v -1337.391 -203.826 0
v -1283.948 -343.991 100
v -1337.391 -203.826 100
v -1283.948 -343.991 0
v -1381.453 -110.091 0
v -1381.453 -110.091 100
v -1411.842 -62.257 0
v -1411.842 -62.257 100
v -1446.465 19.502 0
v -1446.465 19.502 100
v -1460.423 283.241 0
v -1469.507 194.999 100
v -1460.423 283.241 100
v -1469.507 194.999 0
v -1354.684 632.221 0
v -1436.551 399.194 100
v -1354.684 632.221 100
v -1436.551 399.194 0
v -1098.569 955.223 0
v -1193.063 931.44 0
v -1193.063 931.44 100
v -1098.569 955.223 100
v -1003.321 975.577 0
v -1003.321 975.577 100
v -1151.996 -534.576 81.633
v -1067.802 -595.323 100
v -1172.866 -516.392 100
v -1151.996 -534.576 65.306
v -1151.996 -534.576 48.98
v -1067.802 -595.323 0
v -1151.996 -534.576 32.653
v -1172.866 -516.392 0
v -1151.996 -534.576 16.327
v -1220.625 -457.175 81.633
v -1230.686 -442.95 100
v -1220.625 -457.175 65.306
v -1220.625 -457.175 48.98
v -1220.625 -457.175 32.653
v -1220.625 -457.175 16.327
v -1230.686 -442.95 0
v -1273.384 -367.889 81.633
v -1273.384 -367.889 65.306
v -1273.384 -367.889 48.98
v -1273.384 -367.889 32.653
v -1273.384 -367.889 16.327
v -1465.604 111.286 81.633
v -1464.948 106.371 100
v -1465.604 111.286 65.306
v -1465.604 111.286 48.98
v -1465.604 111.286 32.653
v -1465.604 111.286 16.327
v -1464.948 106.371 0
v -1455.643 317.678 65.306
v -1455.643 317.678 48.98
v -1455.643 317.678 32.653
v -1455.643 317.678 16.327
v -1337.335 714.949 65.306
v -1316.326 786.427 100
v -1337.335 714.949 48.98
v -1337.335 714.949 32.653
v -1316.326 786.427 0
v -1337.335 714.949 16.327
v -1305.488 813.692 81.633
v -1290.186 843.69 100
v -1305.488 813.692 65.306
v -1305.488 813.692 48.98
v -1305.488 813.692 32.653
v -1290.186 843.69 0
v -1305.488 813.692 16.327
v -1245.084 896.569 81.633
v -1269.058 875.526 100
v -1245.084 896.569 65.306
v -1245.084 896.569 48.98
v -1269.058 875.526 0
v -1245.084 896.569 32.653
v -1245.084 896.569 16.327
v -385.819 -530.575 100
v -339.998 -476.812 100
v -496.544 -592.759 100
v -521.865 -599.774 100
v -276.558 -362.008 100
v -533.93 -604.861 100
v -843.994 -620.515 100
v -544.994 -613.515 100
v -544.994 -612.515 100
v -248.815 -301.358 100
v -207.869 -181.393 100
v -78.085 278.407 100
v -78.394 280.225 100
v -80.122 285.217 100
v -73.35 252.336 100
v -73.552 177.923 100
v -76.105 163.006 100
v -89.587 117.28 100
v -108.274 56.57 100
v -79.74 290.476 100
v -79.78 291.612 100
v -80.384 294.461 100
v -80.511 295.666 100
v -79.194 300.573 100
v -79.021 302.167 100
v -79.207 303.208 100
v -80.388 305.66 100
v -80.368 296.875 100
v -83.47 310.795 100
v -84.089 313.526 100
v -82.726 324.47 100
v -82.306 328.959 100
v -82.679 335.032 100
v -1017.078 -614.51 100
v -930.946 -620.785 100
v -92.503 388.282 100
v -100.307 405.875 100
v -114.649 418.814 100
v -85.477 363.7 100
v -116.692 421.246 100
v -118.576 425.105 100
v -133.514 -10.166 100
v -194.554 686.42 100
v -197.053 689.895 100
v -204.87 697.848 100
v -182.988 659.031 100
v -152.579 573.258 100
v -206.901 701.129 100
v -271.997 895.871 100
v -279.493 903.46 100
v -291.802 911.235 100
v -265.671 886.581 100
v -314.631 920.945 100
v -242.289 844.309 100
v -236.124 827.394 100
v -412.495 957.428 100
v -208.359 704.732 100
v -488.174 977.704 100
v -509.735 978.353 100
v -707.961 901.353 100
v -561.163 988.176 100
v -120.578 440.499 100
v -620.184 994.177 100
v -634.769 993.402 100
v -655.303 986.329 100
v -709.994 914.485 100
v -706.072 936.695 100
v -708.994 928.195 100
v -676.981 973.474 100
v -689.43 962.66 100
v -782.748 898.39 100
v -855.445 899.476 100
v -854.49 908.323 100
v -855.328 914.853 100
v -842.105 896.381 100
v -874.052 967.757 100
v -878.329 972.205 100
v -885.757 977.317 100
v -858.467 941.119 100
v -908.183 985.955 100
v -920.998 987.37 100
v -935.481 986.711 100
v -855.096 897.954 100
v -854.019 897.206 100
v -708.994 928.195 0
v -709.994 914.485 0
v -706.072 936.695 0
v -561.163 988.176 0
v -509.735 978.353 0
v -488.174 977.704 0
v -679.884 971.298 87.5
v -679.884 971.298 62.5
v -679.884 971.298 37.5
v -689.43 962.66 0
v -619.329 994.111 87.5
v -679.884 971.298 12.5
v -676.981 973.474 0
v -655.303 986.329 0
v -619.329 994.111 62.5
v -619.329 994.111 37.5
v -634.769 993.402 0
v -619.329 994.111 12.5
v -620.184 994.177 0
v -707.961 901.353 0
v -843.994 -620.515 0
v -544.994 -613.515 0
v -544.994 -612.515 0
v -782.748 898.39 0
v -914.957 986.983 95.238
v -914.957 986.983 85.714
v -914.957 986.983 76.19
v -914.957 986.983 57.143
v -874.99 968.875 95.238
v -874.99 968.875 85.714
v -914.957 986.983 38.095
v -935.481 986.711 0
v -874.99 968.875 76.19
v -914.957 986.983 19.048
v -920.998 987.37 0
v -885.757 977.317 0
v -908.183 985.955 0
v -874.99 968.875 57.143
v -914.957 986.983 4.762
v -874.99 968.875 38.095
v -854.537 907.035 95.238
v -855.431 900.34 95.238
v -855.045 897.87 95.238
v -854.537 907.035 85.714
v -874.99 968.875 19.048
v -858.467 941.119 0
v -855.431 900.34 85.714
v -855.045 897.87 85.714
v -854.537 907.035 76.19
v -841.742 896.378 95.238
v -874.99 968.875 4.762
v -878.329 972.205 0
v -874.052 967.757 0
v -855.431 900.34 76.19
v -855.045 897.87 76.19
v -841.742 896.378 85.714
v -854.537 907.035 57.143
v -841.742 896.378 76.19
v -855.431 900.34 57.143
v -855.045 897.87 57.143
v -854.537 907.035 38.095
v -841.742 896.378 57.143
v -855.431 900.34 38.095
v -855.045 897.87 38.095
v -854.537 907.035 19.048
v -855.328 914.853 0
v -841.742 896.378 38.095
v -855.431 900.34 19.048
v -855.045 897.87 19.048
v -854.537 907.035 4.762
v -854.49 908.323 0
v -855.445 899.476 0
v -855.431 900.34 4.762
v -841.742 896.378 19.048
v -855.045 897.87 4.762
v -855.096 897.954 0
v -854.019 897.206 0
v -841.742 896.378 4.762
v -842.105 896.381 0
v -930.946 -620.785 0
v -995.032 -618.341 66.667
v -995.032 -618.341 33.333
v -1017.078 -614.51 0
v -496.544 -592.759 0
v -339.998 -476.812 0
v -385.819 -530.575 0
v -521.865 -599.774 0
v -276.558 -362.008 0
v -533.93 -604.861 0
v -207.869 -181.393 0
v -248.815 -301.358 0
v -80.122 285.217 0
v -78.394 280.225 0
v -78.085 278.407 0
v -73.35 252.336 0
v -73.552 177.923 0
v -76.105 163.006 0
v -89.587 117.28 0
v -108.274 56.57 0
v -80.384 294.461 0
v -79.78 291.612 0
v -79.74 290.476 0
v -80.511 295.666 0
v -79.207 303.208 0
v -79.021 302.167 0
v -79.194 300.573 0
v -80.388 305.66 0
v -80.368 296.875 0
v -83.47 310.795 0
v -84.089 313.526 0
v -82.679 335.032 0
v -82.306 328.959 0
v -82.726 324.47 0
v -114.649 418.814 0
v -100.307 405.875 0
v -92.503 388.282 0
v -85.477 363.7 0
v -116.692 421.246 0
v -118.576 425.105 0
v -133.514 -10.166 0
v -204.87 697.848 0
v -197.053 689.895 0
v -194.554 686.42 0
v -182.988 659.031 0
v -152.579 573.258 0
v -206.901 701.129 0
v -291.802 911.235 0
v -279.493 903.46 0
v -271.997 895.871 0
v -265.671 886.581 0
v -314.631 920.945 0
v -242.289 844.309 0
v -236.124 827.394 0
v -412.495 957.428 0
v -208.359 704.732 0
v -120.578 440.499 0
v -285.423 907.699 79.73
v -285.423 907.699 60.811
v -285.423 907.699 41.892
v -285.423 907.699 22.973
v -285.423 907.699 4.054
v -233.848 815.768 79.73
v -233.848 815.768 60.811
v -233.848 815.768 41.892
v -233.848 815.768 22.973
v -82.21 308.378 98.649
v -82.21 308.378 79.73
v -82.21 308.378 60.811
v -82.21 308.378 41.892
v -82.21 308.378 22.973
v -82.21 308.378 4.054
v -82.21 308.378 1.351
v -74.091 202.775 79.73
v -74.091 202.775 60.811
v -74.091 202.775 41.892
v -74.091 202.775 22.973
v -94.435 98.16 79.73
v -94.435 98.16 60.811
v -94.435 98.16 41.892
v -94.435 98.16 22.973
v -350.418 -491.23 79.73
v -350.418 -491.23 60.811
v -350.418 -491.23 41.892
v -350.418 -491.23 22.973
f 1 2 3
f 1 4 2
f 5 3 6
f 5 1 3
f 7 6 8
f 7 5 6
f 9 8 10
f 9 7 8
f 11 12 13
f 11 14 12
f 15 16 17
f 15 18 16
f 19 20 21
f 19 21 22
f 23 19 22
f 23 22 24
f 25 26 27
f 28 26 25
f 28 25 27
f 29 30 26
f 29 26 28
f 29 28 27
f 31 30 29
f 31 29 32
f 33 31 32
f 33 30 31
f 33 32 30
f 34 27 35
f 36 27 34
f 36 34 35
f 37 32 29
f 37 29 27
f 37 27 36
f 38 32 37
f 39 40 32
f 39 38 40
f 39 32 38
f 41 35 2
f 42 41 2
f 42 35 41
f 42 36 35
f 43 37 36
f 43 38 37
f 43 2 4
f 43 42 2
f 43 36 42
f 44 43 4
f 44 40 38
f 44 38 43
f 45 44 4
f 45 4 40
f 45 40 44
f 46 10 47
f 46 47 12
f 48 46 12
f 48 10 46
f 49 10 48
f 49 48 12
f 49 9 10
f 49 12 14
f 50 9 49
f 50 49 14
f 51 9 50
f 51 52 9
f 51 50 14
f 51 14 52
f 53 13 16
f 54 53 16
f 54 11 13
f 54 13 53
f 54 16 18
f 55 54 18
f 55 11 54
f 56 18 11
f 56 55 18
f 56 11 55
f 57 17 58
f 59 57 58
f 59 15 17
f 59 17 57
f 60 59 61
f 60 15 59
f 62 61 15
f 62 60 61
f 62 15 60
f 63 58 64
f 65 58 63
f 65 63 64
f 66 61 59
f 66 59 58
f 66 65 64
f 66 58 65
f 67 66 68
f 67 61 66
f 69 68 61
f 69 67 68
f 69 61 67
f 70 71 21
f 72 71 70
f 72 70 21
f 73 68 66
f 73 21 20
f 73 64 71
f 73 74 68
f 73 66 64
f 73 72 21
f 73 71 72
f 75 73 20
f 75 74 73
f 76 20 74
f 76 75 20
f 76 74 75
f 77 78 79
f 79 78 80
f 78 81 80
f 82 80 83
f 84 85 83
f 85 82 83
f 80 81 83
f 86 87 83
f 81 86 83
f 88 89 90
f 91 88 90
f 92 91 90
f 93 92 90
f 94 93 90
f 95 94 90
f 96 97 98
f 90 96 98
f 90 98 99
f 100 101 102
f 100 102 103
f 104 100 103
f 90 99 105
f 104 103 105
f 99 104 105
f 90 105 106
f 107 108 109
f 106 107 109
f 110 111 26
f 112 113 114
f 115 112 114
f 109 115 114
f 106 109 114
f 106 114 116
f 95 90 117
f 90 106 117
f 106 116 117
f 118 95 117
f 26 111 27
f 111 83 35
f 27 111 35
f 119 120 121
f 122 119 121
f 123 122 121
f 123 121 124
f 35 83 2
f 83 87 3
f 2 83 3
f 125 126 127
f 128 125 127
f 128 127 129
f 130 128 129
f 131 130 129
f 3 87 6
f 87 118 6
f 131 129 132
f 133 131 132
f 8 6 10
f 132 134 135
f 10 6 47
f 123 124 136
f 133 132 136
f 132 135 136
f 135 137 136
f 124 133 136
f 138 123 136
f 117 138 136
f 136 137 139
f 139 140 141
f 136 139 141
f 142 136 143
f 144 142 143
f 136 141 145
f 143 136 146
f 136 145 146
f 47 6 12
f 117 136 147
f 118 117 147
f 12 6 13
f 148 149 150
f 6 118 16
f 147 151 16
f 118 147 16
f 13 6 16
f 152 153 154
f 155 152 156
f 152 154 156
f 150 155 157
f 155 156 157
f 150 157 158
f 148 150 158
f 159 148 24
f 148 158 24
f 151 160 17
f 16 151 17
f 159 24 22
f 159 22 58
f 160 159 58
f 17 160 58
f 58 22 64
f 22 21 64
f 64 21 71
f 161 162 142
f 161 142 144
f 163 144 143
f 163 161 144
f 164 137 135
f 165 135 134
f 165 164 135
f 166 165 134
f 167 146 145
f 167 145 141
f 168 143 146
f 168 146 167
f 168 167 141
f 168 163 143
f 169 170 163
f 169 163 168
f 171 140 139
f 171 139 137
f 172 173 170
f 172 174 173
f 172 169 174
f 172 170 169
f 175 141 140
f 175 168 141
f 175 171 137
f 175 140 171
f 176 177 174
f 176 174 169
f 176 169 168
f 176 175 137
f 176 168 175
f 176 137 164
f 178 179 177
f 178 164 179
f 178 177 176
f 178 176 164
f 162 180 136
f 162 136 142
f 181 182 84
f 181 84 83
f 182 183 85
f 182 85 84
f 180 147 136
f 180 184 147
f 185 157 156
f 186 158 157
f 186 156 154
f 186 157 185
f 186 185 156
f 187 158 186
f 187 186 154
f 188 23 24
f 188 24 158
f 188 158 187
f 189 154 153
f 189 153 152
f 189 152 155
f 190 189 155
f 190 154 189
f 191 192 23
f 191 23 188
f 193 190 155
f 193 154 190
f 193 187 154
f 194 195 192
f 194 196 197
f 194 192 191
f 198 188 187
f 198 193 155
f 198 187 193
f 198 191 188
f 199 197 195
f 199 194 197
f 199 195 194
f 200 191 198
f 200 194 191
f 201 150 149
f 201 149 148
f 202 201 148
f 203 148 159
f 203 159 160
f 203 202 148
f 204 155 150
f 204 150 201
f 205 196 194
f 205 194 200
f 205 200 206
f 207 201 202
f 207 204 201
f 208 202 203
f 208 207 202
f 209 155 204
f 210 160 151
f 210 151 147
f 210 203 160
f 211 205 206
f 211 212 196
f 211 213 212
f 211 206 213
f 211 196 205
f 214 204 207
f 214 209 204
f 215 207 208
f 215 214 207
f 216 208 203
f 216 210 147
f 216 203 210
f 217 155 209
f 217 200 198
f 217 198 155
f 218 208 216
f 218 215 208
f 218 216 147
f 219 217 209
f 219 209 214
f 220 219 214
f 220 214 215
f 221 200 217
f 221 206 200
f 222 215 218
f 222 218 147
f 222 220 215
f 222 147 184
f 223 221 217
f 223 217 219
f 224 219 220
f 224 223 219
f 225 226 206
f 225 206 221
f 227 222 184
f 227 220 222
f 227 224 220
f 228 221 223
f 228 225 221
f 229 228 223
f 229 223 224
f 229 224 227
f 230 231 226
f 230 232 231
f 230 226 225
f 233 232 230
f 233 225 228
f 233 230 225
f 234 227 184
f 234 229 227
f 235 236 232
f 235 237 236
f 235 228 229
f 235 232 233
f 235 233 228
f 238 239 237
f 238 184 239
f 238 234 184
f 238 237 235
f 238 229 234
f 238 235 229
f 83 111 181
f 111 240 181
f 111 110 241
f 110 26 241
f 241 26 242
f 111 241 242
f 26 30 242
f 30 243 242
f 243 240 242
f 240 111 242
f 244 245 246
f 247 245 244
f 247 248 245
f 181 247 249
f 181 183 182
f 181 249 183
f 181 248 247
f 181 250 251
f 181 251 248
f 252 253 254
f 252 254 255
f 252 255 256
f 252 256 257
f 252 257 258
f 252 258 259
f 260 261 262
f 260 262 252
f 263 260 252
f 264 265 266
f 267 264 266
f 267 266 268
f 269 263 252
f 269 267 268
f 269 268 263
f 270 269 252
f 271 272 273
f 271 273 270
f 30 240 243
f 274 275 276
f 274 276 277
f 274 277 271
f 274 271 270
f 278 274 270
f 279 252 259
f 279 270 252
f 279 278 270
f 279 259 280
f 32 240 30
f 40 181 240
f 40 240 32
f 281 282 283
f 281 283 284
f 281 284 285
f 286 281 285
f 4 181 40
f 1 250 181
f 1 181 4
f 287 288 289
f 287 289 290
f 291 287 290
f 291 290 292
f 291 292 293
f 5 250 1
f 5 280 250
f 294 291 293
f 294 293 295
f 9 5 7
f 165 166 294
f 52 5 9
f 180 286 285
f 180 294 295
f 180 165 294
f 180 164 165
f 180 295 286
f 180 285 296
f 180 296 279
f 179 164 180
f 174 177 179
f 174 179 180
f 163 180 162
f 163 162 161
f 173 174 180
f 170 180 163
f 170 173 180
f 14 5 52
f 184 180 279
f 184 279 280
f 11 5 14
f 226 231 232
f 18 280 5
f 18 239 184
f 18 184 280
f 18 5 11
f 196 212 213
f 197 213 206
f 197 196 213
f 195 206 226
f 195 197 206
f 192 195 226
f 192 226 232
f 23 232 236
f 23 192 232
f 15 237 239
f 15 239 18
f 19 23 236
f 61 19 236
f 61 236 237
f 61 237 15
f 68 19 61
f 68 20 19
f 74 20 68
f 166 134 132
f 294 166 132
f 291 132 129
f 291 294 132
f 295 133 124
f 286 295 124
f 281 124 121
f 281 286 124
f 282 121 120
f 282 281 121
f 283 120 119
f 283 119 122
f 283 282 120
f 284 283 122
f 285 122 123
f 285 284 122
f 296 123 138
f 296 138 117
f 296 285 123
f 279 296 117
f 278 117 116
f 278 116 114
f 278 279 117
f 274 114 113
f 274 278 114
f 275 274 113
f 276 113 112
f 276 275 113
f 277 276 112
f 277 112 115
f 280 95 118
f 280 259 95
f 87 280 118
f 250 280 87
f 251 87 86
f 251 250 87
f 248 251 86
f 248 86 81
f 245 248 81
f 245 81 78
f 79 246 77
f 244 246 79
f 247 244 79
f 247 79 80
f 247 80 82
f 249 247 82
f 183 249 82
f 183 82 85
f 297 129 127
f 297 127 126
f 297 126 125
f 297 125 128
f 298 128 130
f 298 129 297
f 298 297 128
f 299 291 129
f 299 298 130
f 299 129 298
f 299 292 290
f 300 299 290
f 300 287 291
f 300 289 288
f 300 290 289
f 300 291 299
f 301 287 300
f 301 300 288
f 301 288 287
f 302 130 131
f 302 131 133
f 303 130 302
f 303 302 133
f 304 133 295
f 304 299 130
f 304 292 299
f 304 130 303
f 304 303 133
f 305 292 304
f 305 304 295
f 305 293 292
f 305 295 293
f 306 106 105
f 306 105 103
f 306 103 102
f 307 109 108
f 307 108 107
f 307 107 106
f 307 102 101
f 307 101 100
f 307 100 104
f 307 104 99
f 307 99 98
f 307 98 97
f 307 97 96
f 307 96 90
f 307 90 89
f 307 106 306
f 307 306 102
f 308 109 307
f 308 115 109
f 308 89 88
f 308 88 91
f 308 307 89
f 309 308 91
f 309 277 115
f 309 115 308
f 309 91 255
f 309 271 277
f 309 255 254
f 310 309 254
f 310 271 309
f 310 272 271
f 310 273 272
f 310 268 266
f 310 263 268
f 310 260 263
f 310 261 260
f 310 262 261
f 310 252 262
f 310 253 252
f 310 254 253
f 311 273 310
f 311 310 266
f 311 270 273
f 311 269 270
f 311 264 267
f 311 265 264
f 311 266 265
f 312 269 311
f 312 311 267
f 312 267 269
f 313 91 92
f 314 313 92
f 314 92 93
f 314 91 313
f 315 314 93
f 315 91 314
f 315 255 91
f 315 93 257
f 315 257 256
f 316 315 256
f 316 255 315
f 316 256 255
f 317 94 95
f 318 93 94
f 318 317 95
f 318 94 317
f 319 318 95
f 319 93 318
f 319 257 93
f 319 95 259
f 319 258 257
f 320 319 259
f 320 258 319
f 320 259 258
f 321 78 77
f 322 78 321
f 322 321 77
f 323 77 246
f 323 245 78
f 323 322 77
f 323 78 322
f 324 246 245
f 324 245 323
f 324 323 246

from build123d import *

# Parameters (mm, degrees)
BOSS_EXTRUDE1_DEPTH = 100


with BuildPart() as part:
    # faceplate → Boss-Extrude1 (new body)
    with BuildSketch(Plane.XY):
        with BuildLine():
            Line((-544.994463337, -612.515143976), (-544.994463337, -613.515143976))
            Line((-544.994463337, -613.515143976), (-843.994463337, -620.515143976))
            add(Edge.make_bspline(
                [(-1067.80244218, -595.323122819), (-997.118302993, -634.980800497), (-919.007086082, -615.388320094), (-843.994463337, -620.515143976)],
                knots=[0, 0, 0, 0, 1, 1, 1, 1], degree=3))
            add(Edge.make_bspline(
                [(-1067.80244218, -595.323122819), (-1086.847009226, -579.729961904), (-1119.970174816, -561.224126278), (-1156.034719167, -531.360825002), (-1179.138150383, -511.221675605), (-1196.315966942, -490.961554628), (-1213.217398231, -467.461049471), (-1232.397649452, -440.899738497), (-1252.443193652, -410.675686141), (-1269.172612691, -376.572973765), (-1286.514519484, -341.087093501), (-1296.738650953, -301.232376709), (-1313.455916177, -261.143197942), (-1331.041833976, -218.738871303), (-1349.710417714, -174.628391124), (-1370.426950686, -132.166188439), (-1390.701638967, -90.573799688), (-1419.135356979, -54.815891576), (-1435.370486427, -11.470106108), (-1451.768411171, 32.502484745), (-1461.464593921, 79.097443036), (-1467.240520327, 123.638045122), (-1472.384850807, 165.299163162), (-1468.827354686, 202.626831232), (-1466.138049197, 228.429338434), (-1468.2675659, 242.799904931), (-1465.753983266, 248.150925961), (-1464.413789059, 264.200956181), (-1457.615160207, 293.619534204), (-1454.39758417, 337.845564286), (-1438.875880143, 390.748756206), (-1421.192254415, 453.45936783), (-1394.593685546, 518.904193396), (-1375.922839318, 572.231050768), (-1364.069654655, 607.904754904), (-1355.21841365, 628.932491538), (-1349.178109577, 652.608037387), (-1341.652426333, 681.82767433), (-1338.216580607, 716.565441158), (-1327.985576082, 750.106761733), (-1318.017985391, 782.616202465), (-1306.487970813, 813.178643601), (-1292.835449403, 838.709685584), (-1281.186260324, 860.58493493), (-1266.214251902, 880.055386428), (-1236.139476743, 903.56594924), (-1193.192750352, 937.054053735), (-1128.986921291, 949.723978925), (-1077.595251561, 959.023790995), (-1036.017770222, 967.035879578), (-1015.134884478, 973.200541716), (-1003.321346267, 975.57699758)],
                knots=[0, 0, 0, 0, 0.038400577, 0.058895535, 0.073102163, 0.086227031, 0.100287806, 0.118344898, 0.137451121, 0.156851737, 0.177684982, 0.198987409, 0.220891405, 0.245488757, 0.270769139, 0.295710043, 0.319371077, 0.342894453, 0.366423959, 0.391141623, 0.416291007, 0.440510581, 0.46142581, 0.481689057, 0.498630439, 0.502576848, 0.503311323, 0.507792421, 0.527347312, 0.55072337, 0.576659082, 0.613250724, 0.652561818, 0.686915235, 0.701564699, 0.711304434, 0.722509605, 0.739687874, 0.75842357, 0.776832233, 0.794317236, 0.81162249, 0.827752702, 0.839523462, 0.850339049, 0.865807231, 0.8990697, 0.933921409, 0.965998955, 0.981184923, 1, 1, 1, 1], degree=3))
            add(Edge.make_bspline(
                [(-1003.321346267, 975.57699758), (-987.625286887, 977.252933347), (-962.704341777, 982.153446744), (-930.107996089, 988.286600947), (-907.73342782, 986.847160199), (-890.506709849, 980.153836056), (-877.228125332, 972.882171329), (-868.657722365, 960.200996549), (-862.567954839, 949.919049802), (-857.650273693, 940.261982009), (-856.6504648, 932.113160778), (-856.858442051, 925.892378776), (-856.484148597, 920.051139945), (-854.99962702, 913.576766741), (-853.805195867, 906.771565928), (-856.891801948, 896.179933995), (-849.532852724, 897.800494321), (-844.301174531, 896.09886282), (-836.051338893, 896.664214645), (-824.3827293, 897.356086054), (-811.091645754, 897.398998525), (-771.65856362, 898.71200455), (-737.566058229, 900.231134168), (-707.961414353, 901.352522194)],
                knots=[0, 0, 0, 0, 0.13240841, 0.213689757, 0.278435216, 0.316912048, 0.369102621, 0.401753187, 0.4437325, 0.470308429, 0.491738561, 0.51185491, 0.522604246, 0.541061714, 0.565961939, 0.589189548, 0.600387477, 0.616595683, 0.637287508, 0.668004499, 0.715727349, 0.748605259, 1, 1, 1, 1], degree=3))
            Line((-707.961414353, 901.352522194), (-709.994463337, 914.484856024))
            add(Edge.make_bspline(
                [(-709.994463337, 914.484856024), (-710.025141677, 928.111294219), (-706.556524679, 936.469765177), (-693.357896775, 960.709928189), (-674.711163852, 975.882524791), (-653.069107275, 988.272371826), (-626.361572185, 997.152418106), (-592.838906392, 988.511952991), (-545.459079884, 990.015587365), (-510.6758664, 975.288933631), (-488.174265844, 977.704076621)],
                knots=[0, 0, 0, 0, 0.092656003, 0.183249979, 0.277762299, 0.368010184, 0.465335235, 0.58698607, 0.749779645, 1, 1, 1, 1], degree=3))
            add(Edge.make_bspline(
                [(-488.174265844, 977.704076621), (-456.276698424, 973.772819568), (-413.082050902, 956.00139334), (-352.880537776, 940.042979017), (-315.670408772, 920.096845698), (-282.638450263, 909.115656445), (-266.103267679, 889.15808379), (-255.626909848, 864.830458522), (-234.906704646, 837.488931338), (-232.912182322, 797.596000168), (-216.805122627, 762.645190054), (-210.051739344, 729.655910292), (-210.486834721, 699.650404741), (-195.47336716, 689.870798641), (-190.356917308, 675.569305079), (-183.236172501, 660.113219275), (-175.670732081, 641.069479697), (-169.301082892, 624.944272331), (-160.940778667, 606.918509189), (-155.220160251, 586.954996915), (-150.771527302, 563.520719903), (-144.526324466, 542.958930792), (-137.322376345, 520.688253705), (-133.49244601, 498.072411215), (-124.168210293, 475.495115448), (-123.593395619, 456.007770617), (-119.600202312, 438.315780586), (-120.677701477, 423.113128801), (-108.963827659, 414.077110512), (-99.428314275, 406.758279523), (-95.092306104, 394.959107279), (-90.692706124, 383.673283845), (-86.96803427, 372.644834332), (-85.029413703, 361.089359505), (-83.067579223, 348.960606193), (-83.132833363, 337.646119686), (-81.40467488, 324.462048367), (-87.135516072, 311.967656037), (-77.007528945, 302.896484143), (-81.451175559, 296.340032763), (-78.992292255, 290.912569241), (-81.124845036, 285.38267309), (-77.850959558, 280.39504072), (-78.282792033, 272.538915116), (-75.694943087, 264.142711363), (-72.899133528, 253.136627469), (-73.345603979, 242.437648975), (-72.936069744, 230.51918813), (-74.257877633, 218.89550788), (-73.673619291, 207.232098077), (-74.800435642, 194.066808289), (-72.671127502, 179.444613631), (-75.293615575, 163.050653013), (-81.880933058, 149.176288447), (-87.222890375, 126.097374785), (-93.804330664, 101.137095727), (-100.061347869, 75.162630822), (-107.882675618, 61.861927769), (-108.797051733, 51.713845954), (-111.518705333, 42.34242457), (-115.227974273, 30.390584041), (-120.928179416, 16.556405837), (-131.70451367, -4.955944936), (-143.438372488, -34.31166144), (-156.513526554, -68.934431811), (-182.156502861, -121.832398253), (-208.666788719, -180.182076414), (-232.243947306, -246.785558045), (-247.285167827, -303.404388878), (-277.412086588, -362.677807945), (-308.293520213, -429.725258746), (-344.845724502, -485.405793139), (-387.316242531, -537.8993116), (-439.781729376, -562.908683045), (-491.433435635, -596.200471512), (-528.778610805, -598.006021791), (-544.994463337, -612.515143976)],
                knots=[0, 0, 0, 0, 0.048756592, 0.071774008, 0.095128207, 0.113854207, 0.123637851, 0.133836302, 0.154629531, 0.174655872, 0.193344689, 0.212906432, 0.227665298, 0.234662032, 0.238295876, 0.250640502, 0.260992337, 0.269730227, 0.277296236, 0.291500077, 0.301482273, 0.313949682, 0.324487113, 0.337427684, 0.349074149, 0.361675335, 0.366816306, 0.377335959, 0.382346672, 0.388579816, 0.395601081, 0.401011611, 0.407351183, 0.413396259, 0.419000859, 0.426212669, 0.430693542, 0.439508538, 0.444217573, 0.447375039, 0.449630471, 0.452774199, 0.455622726, 0.458079222, 0.464619332, 0.469002917, 0.47546356, 0.480927294, 0.487344125, 0.493373073, 0.498840054, 0.507587332, 0.515914369, 0.523898758, 0.53106219, 0.552208528, 0.563671456, 0.572002946, 0.575321816, 0.579188002, 0.586976445, 0.594554468, 0.602147984, 0.623945166, 0.643092521, 0.658999668, 0.714253083, 0.741476833, 0.767541857, 0.804019748, 0.843270655, 0.880836484, 0.906434173, 0.945574195, 0.968646857, 1, 1, 1, 1], degree=3))
        make_face()
    extrude(amount=BOSS_EXTRUDE1_DEPTH)


solid = part.part
